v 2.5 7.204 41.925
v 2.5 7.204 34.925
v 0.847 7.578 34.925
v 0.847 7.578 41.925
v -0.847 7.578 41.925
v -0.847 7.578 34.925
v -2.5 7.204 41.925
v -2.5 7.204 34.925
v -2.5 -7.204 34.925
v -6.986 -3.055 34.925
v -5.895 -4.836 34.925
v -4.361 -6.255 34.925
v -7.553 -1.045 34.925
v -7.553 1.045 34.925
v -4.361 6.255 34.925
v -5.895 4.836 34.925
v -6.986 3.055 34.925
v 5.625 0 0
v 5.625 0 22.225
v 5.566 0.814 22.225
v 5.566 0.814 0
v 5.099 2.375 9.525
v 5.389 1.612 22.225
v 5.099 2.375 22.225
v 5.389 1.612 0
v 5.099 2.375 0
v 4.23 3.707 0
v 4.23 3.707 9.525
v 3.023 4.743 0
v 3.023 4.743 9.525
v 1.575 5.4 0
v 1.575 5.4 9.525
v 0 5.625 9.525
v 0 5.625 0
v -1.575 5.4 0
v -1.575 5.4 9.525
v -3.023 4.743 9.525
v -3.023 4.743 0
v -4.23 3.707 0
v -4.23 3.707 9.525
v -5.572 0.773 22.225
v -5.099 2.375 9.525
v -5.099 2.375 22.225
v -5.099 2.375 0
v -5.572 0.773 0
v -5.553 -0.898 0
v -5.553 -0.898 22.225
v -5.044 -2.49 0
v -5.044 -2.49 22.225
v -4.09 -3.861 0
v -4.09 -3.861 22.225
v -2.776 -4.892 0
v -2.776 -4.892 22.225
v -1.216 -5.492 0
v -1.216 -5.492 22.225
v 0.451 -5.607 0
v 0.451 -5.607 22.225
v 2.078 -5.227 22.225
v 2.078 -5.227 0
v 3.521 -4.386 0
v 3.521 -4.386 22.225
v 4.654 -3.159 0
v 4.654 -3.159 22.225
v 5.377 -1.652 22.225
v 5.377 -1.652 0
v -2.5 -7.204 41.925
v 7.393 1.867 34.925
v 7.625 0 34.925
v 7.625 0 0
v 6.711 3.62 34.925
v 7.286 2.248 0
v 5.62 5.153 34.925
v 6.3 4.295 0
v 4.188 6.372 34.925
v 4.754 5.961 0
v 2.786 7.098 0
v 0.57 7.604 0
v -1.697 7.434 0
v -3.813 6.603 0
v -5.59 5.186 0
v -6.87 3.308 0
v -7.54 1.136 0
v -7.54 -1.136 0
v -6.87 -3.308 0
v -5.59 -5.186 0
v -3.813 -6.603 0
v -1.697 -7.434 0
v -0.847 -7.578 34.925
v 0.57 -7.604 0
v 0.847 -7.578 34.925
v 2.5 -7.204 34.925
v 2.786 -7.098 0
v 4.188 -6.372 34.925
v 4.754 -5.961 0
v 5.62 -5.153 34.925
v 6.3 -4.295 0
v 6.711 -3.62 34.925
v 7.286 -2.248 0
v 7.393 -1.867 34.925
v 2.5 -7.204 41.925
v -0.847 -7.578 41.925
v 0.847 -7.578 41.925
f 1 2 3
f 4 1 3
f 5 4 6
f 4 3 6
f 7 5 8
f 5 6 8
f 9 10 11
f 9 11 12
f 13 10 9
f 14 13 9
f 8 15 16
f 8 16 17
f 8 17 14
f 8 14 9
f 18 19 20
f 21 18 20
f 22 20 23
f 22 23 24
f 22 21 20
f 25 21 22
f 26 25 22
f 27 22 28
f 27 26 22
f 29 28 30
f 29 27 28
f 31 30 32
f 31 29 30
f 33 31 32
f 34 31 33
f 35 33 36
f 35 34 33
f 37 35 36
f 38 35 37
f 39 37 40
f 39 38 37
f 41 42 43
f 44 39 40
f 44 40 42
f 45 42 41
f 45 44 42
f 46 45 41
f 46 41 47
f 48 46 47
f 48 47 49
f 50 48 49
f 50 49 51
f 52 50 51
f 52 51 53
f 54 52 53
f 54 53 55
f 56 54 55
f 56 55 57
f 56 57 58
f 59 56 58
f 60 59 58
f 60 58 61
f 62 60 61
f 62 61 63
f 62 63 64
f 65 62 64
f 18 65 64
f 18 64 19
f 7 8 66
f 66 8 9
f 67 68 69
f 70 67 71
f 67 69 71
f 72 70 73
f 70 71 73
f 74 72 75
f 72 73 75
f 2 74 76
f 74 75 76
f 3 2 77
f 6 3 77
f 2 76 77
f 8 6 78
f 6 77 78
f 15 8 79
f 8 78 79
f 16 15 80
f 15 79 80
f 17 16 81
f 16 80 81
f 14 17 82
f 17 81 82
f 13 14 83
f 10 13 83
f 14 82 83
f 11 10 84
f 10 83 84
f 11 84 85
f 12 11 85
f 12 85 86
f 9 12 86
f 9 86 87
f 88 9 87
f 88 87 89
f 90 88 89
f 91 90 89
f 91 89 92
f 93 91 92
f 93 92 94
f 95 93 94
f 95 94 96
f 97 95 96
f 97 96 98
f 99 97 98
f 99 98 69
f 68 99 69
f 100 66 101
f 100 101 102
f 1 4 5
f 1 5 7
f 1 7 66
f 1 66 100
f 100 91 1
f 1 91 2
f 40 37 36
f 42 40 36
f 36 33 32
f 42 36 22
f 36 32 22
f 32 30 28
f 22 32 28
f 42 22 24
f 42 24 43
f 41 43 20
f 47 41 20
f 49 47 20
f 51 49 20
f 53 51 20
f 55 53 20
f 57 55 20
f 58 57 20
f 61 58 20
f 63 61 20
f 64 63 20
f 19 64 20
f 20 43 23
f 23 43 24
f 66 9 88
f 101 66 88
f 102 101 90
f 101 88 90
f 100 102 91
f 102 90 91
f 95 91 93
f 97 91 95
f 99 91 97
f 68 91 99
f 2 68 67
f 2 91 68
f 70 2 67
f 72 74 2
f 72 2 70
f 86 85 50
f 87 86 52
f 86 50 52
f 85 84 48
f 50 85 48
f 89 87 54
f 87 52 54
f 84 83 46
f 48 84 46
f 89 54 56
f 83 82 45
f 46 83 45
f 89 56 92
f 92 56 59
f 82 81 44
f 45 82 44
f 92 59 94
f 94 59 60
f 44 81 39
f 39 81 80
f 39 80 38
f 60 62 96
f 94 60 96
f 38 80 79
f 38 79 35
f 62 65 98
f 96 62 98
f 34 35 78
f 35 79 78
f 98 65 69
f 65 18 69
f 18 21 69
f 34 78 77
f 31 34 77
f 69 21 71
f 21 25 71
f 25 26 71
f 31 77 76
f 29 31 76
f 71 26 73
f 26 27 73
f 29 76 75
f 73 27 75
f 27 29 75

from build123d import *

# Parameters (mm, degrees)
F0_R     = 7.625
F1_DEPTH = 34.925
F2_DEPTH = 9.525
F3_DEPTH = 22.225
F5_DEPTH = 7


with BuildPart() as f1:
    # F0 (on Top) → F1 (new body)
    with BuildSketch(Plane.XY):
        Circle(F0_R)
        with BuildLine():
            ThreePointArc((5.0990195136, 2.375), (5.4919308883, 1.2162730442), (5.625, 0))
            ThreePointArc((5.625, 0), (-1.2162730442, -5.4919308883), (-5.0990195136, 2.375))
            ThreePointArc((-5.0990195136, 2.375), (0, 5.625), (5.0990195136, 2.375))
        make_face(mode=Mode.SUBTRACT)
        with BuildLine():
            ThreePointArc((-5.0990195136, 2.375), (-1.2162730442, -5.4919308883), (5.625, 0))
            ThreePointArc((5.625, 0), (5.4919308883, 1.2162730442), (5.0990195136, 2.375))
            Line((5.0990195136, 2.375), (-5.0990195136, 2.375))
        make_face()
        with BuildLine():
            Line((-5.0990195136, 2.375), (5.0990195136, 2.375))
            ThreePointArc((5.0990195136, 2.375), (0, 5.625), (-5.0990195136, 2.375))
        make_face()
    extrude(amount=F1_DEPTH)

    # F0 (on Top) → F2 (cut)
    with BuildSketch(Plane.XY):
        with BuildLine():
            ThreePointArc((-5.0990195136, 2.375), (-1.2162730442, -5.4919308883), (5.625, 0))
            ThreePointArc((5.625, 0), (5.4919308883, 1.2162730442), (5.0990195136, 2.375))
            Line((5.0990195136, 2.375), (-5.0990195136, 2.375))
        make_face()
        with BuildLine():
            Line((-5.0990195136, 2.375), (5.0990195136, 2.375))
            ThreePointArc((5.0990195136, 2.375), (0, 5.625), (-5.0990195136, 2.375))
        make_face()
    extrude(amount=F2_DEPTH, mode=Mode.SUBTRACT)

    # F0 (on Top) → F3 (cut)
    with BuildSketch(Plane.XY):
        with BuildLine():
            ThreePointArc((-5.0990195136, 2.375), (-1.2162730442, -5.4919308883), (5.625, 0))
            ThreePointArc((5.625, 0), (5.4919308883, 1.2162730442), (5.0990195136, 2.375))
            Line((5.0990195136, 2.375), (-5.0990195136, 2.375))
        make_face()
    extrude(amount=F3_DEPTH, mode=Mode.SUBTRACT)

    # F4 (on face) → F5 (join)
    with BuildSketch(Plane.XY.offset(34.925)):
        with BuildLine():
            Line((2.5, -7.2035147671), (2.5, 7.2035147671))
            ThreePointArc((2.5, 7.2035147671), (0, 7.625), (-2.5, 7.2035147671))
            Line((-2.5, 7.2035147671), (-2.5, -7.2035147671))
            ThreePointArc((-2.5, -7.2035147671), (0, -7.625), (2.5, -7.2035147671))
        make_face()
    extrude(amount=F5_DEPTH)


solid = f1.part
